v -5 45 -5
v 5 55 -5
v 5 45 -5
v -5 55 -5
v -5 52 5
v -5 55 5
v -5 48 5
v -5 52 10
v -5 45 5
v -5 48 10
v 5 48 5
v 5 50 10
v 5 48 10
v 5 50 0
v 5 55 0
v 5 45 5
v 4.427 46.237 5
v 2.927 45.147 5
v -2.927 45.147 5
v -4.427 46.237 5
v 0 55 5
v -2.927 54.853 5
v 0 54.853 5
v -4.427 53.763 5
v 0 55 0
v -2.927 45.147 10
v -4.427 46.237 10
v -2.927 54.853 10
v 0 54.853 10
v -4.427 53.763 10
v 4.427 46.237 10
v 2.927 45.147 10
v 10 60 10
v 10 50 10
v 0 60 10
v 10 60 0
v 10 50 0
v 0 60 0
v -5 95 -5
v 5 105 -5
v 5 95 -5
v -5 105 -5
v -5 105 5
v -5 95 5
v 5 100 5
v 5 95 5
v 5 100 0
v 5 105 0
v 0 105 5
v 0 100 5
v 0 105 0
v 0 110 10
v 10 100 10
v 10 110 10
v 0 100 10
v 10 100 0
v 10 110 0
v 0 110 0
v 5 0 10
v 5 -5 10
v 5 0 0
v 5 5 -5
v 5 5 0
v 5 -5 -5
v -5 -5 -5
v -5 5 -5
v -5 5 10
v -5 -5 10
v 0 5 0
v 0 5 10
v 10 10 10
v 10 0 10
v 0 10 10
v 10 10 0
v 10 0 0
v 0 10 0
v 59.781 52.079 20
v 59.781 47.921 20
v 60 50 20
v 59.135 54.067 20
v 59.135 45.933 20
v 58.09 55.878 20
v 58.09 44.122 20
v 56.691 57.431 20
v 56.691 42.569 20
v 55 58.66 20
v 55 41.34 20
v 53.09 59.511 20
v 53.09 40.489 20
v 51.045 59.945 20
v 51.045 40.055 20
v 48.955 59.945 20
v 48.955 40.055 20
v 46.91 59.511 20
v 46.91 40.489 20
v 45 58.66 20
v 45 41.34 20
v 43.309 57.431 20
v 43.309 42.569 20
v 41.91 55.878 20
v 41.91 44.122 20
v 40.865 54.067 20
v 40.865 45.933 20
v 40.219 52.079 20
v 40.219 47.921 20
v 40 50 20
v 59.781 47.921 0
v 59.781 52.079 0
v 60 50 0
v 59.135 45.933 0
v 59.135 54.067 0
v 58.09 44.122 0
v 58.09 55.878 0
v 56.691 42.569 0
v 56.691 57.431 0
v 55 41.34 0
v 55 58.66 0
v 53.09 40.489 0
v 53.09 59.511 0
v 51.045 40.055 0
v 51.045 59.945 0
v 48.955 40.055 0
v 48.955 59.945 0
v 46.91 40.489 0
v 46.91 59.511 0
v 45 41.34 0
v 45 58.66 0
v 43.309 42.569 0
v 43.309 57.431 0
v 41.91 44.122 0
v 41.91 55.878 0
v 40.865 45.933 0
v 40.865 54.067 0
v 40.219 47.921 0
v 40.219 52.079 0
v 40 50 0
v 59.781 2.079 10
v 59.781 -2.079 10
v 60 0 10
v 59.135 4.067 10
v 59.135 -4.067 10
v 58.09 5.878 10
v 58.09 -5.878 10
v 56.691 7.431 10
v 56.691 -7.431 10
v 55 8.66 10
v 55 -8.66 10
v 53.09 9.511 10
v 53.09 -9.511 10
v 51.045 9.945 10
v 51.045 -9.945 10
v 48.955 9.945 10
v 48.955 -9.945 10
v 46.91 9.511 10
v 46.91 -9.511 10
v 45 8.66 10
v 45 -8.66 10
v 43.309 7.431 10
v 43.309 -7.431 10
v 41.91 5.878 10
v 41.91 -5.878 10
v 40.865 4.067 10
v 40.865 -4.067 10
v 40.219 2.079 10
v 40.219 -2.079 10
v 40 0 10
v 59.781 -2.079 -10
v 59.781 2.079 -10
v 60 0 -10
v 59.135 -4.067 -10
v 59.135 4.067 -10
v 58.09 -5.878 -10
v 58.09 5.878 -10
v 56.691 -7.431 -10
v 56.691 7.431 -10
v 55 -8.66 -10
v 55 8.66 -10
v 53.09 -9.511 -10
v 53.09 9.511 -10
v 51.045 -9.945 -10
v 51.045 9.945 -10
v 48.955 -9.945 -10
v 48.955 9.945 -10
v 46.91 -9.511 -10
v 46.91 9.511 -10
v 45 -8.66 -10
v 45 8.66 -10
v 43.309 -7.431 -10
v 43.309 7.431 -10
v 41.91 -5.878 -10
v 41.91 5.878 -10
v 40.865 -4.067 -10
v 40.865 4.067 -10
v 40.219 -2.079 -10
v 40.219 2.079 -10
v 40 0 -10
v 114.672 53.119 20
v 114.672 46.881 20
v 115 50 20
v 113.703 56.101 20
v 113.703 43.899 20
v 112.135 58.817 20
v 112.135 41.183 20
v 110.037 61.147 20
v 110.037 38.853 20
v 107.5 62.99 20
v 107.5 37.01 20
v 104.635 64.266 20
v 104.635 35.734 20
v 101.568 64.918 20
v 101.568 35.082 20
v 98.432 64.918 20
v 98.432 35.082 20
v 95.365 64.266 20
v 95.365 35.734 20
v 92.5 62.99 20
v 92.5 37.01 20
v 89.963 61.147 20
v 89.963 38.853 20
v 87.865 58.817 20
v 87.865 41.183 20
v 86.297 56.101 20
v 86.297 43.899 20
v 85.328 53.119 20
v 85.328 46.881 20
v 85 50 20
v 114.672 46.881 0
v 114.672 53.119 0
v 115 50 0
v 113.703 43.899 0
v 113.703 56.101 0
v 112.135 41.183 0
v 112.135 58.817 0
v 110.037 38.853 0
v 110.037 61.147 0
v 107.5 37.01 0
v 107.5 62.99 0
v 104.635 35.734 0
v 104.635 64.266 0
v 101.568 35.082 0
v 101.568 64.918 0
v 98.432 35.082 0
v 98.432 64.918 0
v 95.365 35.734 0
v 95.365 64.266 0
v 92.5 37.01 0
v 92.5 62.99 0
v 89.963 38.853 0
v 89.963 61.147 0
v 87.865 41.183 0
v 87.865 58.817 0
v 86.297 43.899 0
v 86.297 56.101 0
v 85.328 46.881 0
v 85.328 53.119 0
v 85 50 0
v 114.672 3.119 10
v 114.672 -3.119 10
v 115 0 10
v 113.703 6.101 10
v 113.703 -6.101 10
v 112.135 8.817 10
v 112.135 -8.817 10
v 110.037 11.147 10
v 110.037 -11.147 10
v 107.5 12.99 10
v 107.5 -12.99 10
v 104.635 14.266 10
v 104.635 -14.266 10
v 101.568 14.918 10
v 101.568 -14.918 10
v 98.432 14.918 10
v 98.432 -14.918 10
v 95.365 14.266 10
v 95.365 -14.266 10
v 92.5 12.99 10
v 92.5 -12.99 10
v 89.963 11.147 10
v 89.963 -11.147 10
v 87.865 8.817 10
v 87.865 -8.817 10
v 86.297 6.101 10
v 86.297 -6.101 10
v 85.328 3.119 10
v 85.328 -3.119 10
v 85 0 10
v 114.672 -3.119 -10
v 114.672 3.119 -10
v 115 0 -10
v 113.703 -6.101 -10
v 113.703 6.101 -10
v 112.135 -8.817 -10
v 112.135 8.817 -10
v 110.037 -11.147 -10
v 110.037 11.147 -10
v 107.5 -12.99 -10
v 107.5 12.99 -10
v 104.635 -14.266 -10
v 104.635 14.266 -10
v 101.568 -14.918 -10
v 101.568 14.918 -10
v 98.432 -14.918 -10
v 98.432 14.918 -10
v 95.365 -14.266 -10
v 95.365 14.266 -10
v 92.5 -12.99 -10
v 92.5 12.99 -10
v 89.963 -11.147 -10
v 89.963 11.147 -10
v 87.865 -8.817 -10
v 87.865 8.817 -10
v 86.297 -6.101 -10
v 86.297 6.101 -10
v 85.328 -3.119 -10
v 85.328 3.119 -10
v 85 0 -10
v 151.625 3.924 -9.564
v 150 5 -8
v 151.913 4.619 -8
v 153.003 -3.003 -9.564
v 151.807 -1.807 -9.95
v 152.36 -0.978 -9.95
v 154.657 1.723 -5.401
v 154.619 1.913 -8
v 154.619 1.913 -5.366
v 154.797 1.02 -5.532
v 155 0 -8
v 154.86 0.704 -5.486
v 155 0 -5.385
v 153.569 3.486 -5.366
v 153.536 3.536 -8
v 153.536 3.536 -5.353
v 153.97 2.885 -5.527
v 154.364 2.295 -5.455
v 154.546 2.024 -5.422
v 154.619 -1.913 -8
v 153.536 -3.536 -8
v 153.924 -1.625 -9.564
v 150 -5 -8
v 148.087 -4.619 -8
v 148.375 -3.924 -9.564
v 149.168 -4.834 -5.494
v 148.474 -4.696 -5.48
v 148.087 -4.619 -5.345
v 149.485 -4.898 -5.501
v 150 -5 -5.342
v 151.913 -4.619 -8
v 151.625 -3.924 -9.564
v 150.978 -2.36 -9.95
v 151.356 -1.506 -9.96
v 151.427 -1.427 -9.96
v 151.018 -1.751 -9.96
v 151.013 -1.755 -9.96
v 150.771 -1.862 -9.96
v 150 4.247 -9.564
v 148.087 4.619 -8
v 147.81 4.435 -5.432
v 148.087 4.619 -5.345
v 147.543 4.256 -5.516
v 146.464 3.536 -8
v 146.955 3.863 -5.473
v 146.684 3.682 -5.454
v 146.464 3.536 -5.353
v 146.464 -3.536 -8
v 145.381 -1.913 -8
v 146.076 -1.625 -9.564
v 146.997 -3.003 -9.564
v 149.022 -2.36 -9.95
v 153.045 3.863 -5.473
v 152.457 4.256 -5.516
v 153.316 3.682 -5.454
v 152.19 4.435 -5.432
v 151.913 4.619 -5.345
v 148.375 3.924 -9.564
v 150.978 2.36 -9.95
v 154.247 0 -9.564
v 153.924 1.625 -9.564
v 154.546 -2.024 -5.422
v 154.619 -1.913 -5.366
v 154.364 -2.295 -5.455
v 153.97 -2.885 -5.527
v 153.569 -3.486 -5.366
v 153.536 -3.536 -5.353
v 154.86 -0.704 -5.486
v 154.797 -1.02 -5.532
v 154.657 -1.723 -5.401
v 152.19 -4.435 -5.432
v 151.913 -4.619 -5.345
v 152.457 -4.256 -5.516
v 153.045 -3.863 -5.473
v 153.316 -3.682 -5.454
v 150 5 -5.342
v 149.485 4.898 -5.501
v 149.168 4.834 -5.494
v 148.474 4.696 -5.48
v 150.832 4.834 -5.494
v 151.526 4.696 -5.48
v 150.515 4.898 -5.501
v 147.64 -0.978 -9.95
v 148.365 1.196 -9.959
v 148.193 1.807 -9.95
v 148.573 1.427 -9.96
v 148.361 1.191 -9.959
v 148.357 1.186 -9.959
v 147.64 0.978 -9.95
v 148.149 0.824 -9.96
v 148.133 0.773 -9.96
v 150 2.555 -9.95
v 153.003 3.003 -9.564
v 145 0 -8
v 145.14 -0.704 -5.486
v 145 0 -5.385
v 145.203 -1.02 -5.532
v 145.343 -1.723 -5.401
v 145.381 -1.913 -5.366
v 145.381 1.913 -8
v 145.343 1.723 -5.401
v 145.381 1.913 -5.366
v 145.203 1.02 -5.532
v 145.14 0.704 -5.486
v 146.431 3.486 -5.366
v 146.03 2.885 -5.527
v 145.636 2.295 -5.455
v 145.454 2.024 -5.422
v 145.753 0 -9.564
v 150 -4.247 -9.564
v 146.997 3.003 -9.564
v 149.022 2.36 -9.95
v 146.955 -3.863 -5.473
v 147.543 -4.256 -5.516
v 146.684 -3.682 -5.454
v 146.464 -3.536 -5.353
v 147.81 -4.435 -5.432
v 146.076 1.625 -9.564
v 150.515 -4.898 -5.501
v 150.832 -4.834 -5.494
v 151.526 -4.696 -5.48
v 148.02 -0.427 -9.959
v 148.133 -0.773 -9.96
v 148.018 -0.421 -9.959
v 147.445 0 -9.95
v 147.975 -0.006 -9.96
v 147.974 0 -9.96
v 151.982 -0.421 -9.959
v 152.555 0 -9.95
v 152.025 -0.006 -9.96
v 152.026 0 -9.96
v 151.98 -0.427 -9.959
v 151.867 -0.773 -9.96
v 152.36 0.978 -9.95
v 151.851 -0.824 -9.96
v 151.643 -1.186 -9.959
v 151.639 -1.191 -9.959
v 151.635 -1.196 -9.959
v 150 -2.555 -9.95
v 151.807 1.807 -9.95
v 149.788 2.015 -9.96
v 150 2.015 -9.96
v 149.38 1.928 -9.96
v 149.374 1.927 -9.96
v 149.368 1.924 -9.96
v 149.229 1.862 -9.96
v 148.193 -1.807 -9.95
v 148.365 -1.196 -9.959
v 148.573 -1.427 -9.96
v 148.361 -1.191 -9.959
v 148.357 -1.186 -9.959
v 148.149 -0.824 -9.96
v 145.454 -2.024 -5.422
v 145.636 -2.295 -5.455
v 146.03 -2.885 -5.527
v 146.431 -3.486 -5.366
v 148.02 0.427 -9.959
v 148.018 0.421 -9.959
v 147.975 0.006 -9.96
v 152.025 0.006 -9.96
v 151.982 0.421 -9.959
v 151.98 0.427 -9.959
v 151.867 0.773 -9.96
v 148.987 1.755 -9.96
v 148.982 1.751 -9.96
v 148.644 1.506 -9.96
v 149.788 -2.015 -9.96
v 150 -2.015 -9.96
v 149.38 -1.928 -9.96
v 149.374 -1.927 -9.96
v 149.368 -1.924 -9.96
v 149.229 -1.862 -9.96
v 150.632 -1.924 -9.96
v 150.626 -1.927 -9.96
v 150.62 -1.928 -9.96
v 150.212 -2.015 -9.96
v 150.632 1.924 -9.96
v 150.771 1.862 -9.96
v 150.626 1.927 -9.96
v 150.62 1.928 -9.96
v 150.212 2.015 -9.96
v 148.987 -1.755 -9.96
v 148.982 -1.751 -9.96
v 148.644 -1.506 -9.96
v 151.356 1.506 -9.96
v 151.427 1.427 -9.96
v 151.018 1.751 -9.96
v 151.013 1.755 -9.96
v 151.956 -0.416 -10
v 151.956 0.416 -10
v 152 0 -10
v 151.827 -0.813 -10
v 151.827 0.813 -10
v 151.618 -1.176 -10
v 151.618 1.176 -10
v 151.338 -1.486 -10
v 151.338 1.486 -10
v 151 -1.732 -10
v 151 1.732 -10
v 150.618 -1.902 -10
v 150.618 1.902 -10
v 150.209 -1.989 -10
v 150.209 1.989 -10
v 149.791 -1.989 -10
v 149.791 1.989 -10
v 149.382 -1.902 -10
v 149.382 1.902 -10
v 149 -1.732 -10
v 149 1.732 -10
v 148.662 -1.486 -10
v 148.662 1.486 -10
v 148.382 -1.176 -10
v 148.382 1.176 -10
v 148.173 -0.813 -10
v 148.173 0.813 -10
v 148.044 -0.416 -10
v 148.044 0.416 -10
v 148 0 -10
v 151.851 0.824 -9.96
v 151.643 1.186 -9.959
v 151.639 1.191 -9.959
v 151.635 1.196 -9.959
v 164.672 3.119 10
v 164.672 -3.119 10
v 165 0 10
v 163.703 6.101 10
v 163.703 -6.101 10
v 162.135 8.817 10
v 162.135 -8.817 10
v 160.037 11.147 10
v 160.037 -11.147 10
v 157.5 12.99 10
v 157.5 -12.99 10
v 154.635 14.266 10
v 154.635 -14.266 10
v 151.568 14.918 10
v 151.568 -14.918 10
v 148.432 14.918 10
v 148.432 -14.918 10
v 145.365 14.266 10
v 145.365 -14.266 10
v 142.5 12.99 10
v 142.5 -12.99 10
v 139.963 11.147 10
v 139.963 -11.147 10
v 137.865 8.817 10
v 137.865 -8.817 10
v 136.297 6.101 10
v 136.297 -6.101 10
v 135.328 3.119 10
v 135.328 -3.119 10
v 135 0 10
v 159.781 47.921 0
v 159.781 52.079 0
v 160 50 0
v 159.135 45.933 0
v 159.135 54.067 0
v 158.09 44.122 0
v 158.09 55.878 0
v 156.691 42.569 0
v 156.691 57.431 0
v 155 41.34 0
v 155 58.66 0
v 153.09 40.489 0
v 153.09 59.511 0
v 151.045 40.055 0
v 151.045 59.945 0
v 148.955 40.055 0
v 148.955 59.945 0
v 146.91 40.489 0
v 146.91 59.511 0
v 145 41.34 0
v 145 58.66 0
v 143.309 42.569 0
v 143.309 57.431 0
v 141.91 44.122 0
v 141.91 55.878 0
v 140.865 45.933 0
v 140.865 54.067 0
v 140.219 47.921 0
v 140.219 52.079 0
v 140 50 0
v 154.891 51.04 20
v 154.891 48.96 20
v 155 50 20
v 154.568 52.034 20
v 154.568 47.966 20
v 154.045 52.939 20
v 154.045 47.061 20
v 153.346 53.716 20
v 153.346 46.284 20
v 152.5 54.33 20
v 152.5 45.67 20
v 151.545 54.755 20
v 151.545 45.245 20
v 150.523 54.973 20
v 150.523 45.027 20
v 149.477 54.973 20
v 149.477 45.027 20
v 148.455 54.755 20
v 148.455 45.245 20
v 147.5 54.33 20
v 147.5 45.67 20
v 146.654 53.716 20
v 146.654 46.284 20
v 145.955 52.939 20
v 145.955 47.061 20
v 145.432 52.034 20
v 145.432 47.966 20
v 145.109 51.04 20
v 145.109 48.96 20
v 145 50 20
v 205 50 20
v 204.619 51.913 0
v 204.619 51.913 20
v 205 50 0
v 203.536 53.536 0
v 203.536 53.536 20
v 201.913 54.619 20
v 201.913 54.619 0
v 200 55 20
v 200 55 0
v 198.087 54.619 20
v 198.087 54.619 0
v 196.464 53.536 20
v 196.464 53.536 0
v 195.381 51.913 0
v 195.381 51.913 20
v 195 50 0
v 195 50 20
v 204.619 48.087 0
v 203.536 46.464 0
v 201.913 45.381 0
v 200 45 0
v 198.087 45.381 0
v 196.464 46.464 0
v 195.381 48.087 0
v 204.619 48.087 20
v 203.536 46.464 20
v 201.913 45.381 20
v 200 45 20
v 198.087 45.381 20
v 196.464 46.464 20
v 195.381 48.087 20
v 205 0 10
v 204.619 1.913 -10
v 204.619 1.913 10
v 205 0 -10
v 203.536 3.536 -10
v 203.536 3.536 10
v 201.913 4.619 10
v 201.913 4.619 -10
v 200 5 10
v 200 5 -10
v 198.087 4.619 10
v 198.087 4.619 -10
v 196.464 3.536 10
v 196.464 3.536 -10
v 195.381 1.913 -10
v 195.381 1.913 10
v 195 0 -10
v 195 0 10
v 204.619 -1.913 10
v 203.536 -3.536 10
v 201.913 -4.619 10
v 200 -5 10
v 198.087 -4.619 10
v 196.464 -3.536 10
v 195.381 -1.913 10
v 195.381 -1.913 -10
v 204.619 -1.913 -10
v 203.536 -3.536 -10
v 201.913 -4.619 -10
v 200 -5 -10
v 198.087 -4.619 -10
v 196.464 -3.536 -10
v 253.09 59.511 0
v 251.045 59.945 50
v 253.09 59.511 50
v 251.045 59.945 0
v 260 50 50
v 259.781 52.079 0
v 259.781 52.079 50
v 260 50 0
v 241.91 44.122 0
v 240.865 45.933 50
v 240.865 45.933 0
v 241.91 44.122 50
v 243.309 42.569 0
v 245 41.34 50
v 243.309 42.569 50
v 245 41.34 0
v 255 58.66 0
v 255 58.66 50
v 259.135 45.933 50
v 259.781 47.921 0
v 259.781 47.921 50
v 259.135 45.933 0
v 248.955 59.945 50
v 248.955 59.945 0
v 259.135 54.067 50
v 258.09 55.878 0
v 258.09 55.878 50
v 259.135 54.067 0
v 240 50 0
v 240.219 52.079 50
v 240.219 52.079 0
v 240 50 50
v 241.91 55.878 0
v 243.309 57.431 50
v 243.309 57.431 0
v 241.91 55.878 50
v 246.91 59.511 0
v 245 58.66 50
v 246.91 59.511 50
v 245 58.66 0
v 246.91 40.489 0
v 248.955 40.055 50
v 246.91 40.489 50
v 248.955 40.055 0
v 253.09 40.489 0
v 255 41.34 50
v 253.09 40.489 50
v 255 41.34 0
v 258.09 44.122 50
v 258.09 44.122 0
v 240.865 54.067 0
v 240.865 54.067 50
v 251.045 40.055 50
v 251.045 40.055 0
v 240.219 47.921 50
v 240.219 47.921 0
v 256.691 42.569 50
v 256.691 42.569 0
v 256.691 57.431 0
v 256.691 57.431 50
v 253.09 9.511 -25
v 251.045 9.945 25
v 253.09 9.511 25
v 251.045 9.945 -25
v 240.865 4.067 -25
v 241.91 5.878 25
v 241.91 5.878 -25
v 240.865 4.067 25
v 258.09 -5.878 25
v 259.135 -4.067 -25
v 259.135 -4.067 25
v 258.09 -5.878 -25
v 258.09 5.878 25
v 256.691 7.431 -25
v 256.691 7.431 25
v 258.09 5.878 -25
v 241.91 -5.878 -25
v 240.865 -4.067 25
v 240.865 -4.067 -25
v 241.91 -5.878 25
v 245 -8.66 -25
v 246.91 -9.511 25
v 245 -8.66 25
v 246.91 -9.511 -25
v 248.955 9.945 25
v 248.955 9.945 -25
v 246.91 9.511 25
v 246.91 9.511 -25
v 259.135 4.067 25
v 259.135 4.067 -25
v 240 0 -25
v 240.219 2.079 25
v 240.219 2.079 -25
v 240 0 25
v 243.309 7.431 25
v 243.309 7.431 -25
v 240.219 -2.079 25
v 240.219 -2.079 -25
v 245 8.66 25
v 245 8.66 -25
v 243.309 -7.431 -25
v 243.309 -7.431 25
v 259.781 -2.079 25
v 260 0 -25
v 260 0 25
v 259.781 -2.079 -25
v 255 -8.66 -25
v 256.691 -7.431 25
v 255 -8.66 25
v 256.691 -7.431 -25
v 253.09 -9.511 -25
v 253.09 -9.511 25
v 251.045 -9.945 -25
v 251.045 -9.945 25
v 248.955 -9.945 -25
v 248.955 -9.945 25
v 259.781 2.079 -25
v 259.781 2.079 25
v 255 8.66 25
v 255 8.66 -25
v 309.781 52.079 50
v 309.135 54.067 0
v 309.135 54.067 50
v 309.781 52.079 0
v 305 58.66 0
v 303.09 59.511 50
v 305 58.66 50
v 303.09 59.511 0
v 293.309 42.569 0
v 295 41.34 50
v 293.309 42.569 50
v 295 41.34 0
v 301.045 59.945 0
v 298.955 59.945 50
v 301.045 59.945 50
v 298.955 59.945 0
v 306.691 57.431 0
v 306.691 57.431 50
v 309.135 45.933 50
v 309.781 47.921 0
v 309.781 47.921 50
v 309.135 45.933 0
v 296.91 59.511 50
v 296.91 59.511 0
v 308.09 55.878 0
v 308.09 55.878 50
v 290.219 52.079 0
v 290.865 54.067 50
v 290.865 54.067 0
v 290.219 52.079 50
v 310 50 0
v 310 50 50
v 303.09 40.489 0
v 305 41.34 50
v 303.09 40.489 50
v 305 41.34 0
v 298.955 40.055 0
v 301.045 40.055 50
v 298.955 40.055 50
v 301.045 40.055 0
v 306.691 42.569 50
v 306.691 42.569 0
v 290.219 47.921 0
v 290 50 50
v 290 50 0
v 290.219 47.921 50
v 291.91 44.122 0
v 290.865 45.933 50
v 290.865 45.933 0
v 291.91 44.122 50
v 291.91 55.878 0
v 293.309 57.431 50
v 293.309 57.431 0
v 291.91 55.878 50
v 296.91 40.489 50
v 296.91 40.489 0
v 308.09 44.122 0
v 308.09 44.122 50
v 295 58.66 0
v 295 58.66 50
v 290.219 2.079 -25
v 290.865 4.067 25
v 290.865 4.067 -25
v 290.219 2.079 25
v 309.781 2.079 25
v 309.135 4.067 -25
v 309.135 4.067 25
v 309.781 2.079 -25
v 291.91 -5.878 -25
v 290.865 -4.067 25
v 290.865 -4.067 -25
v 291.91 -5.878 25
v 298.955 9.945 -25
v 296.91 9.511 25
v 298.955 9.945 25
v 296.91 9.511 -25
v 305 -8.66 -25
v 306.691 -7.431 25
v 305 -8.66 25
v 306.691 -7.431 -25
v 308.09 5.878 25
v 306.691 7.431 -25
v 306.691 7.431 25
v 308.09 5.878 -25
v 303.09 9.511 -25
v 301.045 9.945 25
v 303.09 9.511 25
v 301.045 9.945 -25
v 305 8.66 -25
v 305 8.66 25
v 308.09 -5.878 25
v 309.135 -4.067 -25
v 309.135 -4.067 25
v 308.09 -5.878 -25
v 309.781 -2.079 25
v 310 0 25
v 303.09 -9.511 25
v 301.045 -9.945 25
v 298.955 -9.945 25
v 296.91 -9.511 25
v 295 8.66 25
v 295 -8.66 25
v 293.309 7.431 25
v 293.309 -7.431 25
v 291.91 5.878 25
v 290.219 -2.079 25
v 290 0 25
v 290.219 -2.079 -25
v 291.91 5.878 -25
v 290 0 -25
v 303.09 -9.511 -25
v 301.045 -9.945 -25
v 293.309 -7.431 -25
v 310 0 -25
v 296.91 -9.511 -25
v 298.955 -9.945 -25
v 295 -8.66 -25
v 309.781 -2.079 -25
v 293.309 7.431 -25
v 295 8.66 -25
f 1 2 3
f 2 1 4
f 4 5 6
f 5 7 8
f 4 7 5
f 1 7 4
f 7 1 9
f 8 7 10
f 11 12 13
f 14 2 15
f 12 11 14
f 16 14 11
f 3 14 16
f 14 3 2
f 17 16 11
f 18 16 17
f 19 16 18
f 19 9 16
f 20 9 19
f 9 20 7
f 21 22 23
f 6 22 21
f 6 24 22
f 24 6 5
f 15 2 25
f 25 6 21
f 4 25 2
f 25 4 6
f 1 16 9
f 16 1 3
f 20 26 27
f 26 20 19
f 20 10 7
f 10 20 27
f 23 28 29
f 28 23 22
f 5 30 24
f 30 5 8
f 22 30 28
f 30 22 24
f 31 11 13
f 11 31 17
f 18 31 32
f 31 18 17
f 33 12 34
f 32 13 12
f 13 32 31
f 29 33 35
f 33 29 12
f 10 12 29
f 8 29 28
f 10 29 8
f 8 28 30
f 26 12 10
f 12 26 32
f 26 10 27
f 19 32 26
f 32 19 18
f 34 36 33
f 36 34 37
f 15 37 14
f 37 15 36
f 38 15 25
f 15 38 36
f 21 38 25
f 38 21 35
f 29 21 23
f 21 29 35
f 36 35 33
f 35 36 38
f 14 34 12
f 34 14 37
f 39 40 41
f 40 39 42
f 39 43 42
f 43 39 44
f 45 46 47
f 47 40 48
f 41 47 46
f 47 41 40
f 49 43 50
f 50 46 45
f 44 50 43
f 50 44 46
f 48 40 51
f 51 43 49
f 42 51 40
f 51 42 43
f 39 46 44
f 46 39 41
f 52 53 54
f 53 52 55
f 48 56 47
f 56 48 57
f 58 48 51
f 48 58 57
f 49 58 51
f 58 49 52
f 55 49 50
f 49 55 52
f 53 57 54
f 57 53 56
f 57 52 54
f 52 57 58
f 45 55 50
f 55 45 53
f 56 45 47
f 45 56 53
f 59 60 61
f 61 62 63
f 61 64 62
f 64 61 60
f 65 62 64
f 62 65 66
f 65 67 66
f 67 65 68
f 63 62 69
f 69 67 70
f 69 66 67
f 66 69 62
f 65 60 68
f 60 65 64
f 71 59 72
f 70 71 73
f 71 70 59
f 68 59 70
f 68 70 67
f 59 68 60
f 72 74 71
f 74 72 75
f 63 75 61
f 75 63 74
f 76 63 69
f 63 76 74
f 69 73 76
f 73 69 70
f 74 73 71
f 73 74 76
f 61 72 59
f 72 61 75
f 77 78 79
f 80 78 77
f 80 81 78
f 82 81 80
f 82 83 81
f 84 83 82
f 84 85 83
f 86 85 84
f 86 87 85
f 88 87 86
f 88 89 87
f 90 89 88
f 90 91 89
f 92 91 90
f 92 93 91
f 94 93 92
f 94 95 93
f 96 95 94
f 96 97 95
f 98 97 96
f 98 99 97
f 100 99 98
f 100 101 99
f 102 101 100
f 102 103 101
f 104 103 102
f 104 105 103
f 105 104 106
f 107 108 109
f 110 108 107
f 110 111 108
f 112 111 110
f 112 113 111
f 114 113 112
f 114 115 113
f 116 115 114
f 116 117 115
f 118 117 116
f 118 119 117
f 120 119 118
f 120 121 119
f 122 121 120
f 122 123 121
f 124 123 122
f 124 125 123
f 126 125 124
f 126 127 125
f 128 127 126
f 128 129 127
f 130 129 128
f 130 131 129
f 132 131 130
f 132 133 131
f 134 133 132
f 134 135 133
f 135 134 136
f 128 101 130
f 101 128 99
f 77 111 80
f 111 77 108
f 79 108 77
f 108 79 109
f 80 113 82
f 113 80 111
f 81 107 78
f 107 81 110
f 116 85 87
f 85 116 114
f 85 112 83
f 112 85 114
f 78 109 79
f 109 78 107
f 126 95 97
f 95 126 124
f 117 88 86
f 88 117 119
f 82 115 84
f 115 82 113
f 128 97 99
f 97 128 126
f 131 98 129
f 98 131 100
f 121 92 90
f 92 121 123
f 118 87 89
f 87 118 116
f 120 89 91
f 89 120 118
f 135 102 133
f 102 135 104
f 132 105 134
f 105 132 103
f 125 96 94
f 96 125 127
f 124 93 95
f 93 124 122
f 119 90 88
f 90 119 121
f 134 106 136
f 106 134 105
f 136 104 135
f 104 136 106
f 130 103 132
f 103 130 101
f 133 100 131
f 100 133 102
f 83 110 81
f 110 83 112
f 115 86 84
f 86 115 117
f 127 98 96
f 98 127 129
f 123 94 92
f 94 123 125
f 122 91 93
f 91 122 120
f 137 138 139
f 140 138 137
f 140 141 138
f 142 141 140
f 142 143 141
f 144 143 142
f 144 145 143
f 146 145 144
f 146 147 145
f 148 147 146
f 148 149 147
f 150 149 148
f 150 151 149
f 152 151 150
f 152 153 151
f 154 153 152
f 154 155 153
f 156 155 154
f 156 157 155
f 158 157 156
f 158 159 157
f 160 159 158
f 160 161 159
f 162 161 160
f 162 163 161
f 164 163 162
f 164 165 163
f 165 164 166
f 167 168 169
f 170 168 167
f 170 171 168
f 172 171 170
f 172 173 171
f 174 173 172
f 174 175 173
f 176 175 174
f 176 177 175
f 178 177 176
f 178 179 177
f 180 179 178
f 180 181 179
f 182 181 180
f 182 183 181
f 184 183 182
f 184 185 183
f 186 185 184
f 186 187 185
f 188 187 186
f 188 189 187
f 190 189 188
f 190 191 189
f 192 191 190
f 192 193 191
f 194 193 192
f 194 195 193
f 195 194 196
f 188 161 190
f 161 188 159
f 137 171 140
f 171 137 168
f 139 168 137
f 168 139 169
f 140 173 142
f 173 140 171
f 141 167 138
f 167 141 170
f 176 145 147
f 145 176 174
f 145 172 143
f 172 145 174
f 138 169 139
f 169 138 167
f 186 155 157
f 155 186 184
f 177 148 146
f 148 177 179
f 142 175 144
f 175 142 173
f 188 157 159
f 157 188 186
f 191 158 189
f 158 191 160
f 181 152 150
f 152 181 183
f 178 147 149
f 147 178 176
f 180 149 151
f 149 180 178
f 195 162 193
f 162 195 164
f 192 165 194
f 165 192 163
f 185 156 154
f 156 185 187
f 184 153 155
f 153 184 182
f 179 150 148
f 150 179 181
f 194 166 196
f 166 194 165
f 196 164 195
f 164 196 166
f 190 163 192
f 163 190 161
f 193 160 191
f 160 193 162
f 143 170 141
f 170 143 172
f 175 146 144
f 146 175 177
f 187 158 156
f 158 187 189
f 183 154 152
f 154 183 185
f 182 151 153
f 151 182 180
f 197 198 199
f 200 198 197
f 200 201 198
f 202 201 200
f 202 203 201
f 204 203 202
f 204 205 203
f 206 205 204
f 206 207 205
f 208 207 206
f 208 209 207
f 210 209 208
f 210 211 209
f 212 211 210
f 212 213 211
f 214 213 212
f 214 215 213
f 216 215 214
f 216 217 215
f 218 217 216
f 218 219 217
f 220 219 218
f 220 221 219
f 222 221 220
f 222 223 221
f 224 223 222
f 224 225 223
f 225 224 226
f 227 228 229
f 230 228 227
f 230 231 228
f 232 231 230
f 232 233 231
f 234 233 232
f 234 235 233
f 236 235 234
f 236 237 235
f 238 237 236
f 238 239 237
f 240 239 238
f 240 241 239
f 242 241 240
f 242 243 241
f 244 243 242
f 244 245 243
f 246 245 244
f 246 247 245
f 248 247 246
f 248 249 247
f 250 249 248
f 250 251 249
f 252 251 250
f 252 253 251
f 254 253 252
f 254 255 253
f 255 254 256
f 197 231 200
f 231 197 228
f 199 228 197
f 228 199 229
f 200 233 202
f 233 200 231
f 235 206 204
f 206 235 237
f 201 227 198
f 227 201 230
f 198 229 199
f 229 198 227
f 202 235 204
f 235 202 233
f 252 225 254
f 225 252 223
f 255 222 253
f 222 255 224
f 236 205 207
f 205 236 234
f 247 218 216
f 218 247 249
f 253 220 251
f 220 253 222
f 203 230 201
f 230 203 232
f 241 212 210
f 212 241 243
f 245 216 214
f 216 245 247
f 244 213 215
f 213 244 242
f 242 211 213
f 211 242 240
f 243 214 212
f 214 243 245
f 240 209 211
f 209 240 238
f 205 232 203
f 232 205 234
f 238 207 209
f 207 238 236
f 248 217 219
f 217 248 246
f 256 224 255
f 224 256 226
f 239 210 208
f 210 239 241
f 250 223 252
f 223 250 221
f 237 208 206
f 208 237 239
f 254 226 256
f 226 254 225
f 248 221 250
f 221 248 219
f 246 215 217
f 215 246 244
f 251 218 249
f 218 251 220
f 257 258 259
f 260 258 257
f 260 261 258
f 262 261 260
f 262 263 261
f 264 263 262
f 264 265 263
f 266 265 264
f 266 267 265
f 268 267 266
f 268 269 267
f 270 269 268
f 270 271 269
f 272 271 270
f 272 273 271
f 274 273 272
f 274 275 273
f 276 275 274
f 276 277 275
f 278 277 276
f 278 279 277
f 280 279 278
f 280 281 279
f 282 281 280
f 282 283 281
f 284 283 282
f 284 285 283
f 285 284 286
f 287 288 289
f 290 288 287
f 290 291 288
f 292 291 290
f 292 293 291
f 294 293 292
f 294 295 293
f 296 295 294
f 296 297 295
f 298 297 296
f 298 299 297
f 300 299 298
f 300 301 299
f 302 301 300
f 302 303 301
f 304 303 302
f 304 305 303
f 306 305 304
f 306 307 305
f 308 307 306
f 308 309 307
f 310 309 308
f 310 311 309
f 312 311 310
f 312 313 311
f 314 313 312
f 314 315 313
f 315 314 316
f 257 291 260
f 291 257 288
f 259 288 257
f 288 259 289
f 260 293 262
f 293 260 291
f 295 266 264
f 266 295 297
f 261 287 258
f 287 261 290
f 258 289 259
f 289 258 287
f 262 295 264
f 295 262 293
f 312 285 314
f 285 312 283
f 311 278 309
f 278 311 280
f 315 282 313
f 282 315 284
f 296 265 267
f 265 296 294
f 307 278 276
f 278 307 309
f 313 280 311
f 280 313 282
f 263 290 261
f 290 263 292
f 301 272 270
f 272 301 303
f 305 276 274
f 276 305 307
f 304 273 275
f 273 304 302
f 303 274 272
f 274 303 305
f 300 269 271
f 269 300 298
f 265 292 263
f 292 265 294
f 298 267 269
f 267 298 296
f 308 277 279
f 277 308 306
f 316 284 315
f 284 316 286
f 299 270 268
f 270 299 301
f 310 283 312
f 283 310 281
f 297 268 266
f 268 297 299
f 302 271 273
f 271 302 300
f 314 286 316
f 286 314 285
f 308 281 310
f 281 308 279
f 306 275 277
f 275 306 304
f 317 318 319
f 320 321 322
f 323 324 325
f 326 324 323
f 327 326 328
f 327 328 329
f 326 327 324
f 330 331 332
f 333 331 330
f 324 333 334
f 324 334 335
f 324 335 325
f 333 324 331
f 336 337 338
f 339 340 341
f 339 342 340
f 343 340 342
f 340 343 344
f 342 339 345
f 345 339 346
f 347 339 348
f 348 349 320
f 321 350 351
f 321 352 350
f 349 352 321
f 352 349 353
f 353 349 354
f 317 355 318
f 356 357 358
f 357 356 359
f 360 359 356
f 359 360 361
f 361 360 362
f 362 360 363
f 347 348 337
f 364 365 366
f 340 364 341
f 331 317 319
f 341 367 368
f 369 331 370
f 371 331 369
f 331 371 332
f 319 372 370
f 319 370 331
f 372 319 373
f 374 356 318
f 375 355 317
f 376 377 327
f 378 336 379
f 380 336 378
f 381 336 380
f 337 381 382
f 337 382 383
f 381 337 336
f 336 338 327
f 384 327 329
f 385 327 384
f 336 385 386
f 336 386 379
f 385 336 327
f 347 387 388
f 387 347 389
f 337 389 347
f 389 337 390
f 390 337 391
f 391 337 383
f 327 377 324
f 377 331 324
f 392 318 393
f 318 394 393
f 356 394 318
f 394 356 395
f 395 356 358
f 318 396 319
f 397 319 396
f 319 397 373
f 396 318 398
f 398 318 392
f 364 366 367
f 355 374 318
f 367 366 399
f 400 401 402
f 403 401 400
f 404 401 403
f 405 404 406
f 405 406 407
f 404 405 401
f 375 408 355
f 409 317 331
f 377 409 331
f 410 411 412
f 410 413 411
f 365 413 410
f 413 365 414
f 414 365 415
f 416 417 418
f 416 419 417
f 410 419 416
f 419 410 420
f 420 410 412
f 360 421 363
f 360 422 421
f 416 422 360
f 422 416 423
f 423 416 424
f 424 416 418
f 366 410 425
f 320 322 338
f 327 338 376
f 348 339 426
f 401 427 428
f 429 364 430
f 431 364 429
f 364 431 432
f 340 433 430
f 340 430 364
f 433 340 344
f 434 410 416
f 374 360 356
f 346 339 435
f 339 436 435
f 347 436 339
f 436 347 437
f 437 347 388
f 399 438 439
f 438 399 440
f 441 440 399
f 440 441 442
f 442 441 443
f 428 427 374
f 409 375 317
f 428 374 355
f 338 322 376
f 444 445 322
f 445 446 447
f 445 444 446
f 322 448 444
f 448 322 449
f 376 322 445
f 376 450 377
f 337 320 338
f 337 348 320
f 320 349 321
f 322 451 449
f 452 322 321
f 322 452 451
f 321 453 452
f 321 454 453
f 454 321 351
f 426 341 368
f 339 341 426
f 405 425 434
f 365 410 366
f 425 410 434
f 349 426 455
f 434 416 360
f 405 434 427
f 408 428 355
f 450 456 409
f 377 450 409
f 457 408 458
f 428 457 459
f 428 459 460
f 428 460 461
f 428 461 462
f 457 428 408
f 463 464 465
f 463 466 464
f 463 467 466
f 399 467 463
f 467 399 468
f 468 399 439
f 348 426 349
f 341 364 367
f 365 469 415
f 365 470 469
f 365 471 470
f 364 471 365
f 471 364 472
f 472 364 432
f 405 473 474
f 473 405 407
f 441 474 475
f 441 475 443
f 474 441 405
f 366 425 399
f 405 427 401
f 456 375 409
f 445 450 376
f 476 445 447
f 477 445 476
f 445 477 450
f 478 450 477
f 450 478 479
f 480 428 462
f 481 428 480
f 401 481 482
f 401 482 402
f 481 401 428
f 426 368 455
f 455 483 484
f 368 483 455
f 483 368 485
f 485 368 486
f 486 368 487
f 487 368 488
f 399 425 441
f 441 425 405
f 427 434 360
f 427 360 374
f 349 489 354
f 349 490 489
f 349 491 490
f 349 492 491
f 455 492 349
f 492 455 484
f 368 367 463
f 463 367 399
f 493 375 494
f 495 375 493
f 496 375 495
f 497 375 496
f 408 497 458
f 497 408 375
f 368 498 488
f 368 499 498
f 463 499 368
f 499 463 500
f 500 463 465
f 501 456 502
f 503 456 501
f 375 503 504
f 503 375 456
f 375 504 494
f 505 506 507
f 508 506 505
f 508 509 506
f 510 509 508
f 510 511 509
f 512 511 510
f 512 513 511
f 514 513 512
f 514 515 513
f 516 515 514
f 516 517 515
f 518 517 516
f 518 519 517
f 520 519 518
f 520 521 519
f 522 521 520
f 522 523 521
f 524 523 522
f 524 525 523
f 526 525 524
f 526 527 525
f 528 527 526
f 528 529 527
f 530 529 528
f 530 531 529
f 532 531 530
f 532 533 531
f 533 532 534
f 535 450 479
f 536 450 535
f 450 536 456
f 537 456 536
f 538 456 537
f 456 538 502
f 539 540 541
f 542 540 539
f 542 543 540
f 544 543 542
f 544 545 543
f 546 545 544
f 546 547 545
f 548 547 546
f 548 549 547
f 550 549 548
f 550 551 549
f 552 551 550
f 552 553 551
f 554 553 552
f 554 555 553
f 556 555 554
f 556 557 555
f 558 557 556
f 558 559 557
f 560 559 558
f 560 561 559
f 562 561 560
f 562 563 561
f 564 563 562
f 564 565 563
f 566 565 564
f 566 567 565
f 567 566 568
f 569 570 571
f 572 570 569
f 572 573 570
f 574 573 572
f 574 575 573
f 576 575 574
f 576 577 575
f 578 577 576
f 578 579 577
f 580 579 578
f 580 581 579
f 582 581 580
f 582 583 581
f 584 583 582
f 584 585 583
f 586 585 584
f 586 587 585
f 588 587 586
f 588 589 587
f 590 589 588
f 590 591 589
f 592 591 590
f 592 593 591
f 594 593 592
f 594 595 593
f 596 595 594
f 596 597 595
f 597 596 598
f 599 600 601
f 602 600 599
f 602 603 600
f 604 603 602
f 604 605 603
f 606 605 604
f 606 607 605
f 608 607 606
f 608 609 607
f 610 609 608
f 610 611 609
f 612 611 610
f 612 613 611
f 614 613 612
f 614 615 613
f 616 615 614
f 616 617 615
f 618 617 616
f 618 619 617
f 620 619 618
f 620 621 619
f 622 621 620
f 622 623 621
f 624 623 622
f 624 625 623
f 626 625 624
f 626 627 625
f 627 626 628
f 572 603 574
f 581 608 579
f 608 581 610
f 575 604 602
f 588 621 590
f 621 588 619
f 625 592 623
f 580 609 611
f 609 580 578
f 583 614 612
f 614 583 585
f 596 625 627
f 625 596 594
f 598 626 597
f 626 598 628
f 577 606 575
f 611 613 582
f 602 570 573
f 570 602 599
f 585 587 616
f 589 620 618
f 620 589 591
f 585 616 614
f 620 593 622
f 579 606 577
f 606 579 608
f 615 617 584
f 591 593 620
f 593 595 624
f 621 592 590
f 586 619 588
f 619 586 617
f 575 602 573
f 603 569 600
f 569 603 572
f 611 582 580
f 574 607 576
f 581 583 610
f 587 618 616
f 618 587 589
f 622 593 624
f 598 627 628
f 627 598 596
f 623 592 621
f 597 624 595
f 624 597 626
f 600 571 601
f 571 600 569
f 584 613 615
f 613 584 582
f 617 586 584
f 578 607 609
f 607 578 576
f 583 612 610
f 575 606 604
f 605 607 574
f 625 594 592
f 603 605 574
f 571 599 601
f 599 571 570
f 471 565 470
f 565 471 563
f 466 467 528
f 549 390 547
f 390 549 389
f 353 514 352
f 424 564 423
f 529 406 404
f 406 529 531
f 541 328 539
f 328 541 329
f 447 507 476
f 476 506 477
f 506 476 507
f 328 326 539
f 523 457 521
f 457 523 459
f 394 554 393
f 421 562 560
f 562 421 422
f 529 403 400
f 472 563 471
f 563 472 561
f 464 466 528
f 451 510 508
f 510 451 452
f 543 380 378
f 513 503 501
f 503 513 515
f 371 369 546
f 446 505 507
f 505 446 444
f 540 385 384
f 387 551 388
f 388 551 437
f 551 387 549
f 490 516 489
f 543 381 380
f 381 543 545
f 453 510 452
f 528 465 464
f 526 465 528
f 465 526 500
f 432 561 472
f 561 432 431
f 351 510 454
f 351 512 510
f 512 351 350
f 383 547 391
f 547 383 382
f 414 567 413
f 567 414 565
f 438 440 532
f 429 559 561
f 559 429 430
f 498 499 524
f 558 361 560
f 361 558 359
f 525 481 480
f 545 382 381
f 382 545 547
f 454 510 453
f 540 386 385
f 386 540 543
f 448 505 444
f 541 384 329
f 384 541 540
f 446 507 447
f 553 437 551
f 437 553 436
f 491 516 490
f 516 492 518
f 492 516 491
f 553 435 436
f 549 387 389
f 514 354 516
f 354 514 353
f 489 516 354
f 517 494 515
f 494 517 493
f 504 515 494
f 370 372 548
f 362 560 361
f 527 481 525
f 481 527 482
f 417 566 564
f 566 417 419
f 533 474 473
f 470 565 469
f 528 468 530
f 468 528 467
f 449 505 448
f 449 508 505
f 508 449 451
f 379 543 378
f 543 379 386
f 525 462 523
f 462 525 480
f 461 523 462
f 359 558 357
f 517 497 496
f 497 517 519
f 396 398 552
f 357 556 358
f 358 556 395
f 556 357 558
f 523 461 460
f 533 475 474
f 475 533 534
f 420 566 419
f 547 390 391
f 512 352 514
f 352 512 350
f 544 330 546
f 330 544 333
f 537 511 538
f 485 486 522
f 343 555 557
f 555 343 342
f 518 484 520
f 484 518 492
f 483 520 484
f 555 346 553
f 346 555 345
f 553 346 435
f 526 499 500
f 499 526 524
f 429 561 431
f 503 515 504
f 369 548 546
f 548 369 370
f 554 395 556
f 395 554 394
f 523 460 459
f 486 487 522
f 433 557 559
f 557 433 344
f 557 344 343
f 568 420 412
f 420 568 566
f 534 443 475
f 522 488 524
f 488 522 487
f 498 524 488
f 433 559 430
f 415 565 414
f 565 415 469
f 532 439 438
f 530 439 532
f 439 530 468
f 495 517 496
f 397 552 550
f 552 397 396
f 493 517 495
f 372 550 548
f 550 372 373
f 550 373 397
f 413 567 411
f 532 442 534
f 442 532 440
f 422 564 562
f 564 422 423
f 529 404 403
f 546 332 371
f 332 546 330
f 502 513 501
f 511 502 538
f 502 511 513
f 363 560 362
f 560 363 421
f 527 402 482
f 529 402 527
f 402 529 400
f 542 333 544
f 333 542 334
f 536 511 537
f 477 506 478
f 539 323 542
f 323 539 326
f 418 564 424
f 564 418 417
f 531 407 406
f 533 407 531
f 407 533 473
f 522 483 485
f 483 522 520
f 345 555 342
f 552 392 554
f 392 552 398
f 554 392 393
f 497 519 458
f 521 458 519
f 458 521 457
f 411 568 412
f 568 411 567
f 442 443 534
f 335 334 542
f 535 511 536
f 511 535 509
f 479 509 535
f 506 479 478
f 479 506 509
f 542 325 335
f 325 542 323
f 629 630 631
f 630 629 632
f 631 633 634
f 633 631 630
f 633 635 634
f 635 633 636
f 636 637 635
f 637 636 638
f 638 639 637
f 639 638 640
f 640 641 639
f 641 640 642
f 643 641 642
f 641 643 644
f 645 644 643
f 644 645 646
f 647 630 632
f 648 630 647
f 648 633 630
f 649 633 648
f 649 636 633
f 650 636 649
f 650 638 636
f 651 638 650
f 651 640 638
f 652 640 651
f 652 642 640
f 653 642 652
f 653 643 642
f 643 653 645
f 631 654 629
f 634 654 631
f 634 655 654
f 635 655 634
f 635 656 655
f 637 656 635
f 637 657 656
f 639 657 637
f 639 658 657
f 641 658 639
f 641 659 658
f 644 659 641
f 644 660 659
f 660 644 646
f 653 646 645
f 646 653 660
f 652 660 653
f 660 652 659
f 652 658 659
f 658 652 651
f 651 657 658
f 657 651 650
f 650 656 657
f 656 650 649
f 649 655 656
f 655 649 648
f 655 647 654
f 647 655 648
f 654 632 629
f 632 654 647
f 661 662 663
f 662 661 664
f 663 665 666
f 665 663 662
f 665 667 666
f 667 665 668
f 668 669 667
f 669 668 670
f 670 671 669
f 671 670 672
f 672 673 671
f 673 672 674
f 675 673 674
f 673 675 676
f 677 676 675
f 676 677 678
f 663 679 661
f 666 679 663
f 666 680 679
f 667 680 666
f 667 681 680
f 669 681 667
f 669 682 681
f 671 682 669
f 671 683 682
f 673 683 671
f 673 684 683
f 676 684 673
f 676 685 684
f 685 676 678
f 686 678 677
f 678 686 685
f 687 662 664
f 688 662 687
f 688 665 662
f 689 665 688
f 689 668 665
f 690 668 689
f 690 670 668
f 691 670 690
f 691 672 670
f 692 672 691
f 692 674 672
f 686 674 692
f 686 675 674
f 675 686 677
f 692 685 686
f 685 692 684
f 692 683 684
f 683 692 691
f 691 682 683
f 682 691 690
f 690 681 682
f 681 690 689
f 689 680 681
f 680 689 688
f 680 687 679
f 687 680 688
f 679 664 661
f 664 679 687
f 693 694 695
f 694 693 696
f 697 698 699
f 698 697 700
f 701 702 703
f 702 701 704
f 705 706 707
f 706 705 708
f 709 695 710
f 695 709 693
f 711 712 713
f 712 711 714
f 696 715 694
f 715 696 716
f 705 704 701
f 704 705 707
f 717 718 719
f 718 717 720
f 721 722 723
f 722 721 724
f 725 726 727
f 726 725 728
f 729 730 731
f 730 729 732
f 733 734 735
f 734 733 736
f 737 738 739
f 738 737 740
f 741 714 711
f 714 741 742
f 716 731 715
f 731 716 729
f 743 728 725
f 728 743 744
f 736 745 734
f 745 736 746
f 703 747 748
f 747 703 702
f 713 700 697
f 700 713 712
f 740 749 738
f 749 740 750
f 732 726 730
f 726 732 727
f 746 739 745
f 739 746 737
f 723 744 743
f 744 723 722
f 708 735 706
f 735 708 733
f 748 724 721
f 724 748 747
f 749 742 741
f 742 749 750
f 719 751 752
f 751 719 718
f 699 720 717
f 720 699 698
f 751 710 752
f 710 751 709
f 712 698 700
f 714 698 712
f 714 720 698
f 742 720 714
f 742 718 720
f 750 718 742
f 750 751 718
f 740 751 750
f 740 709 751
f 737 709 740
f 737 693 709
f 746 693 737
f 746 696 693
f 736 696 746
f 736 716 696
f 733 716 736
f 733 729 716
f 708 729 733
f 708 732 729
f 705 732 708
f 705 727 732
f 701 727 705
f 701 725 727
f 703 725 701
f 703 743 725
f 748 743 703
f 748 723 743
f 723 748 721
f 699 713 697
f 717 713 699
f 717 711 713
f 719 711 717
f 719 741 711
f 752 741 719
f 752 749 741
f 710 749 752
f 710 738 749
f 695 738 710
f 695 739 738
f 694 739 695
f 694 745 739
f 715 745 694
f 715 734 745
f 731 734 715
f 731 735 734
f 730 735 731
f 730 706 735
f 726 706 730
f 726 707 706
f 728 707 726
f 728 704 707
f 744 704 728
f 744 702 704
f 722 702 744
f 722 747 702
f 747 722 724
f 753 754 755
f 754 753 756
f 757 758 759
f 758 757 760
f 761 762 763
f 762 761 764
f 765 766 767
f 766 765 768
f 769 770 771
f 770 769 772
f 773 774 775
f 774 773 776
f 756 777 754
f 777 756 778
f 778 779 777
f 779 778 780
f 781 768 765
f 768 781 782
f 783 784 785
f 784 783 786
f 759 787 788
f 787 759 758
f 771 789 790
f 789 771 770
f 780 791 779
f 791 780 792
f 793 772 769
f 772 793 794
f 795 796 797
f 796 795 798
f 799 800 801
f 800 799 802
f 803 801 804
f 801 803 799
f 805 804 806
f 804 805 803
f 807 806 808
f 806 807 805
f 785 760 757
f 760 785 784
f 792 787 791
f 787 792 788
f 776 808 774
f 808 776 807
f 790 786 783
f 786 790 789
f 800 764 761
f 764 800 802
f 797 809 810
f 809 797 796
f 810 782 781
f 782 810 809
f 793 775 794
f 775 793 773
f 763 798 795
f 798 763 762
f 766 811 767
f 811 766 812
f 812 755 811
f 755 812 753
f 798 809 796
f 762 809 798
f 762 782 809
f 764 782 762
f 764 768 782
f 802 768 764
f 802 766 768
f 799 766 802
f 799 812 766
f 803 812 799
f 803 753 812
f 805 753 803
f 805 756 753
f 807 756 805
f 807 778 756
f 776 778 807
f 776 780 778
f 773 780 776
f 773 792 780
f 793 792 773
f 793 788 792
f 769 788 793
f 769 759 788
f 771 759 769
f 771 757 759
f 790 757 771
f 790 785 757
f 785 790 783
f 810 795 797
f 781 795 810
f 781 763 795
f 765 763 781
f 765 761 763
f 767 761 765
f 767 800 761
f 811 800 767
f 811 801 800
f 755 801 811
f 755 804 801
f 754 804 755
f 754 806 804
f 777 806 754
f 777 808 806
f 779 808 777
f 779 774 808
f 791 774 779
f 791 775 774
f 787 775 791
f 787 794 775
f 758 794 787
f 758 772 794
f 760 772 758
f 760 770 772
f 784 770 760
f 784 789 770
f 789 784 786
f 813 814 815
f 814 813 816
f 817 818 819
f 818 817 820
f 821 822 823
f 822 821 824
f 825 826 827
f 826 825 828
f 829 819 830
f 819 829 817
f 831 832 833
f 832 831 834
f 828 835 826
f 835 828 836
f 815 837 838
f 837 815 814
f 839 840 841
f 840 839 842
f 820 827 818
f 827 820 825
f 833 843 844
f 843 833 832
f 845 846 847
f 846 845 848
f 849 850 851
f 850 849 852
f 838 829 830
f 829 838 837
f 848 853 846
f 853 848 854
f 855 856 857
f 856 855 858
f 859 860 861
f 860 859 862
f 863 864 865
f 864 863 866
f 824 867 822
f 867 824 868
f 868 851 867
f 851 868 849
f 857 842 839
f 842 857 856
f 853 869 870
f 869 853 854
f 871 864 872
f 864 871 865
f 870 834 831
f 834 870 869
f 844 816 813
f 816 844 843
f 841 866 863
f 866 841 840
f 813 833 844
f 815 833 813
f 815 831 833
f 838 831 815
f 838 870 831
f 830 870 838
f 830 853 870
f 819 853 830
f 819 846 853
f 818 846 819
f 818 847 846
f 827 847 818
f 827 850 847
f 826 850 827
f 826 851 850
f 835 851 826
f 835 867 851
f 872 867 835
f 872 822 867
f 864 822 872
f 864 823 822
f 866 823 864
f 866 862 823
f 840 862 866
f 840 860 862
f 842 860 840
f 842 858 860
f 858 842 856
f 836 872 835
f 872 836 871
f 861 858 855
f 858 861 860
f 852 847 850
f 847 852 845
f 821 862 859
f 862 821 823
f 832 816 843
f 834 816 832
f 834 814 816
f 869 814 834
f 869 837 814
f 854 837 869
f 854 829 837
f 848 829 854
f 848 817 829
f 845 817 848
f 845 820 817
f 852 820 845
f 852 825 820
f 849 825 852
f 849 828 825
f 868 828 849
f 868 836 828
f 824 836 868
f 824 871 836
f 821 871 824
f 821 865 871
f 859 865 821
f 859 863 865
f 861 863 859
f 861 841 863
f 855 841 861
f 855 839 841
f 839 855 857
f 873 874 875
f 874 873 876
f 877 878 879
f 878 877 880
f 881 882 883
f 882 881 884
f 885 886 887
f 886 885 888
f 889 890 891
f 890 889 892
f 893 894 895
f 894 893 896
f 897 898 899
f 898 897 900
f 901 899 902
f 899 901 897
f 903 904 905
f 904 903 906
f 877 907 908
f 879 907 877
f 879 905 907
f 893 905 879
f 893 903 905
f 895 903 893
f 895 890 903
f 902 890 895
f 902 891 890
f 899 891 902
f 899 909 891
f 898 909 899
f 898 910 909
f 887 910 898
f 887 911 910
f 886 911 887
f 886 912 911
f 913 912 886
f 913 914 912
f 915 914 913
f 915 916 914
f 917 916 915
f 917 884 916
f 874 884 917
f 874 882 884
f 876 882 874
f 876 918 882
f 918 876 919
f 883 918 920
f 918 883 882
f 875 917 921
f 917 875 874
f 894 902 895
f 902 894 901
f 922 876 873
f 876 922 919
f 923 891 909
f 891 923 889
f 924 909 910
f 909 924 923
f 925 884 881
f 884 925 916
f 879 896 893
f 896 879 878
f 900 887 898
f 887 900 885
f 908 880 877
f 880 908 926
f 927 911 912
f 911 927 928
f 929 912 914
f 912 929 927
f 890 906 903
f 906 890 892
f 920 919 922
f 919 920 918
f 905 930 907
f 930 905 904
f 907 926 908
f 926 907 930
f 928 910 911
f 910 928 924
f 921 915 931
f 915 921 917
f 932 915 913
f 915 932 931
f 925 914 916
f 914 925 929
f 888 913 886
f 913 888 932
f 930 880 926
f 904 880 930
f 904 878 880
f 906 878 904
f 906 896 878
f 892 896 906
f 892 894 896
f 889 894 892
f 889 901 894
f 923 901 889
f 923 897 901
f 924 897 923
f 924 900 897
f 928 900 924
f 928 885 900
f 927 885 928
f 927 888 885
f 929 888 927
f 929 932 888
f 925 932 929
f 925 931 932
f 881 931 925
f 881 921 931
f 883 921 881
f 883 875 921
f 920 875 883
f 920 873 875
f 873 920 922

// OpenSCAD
// file: ../common/transformations.scad
// https://en.wikibooks.org/wiki/OpenSCAD_User_Manual/Transformations#offset

/**
Rounds all inside (concave) corners but leaves flat walls unchanged.
Holes less than 2 * \r in diameter vanish.
Think of this transformation as a circle sliding around the exterior of the
shape.
*/
module fillet(r) { offset(r = -r) offset(delta = r) children(); }

/**
Rounds all outside (convex) corners but leaves flat walls unchanged.
Walls less than 2 * \r thick vanish.
Think of this transformation as a circle sliding around the interior of the
shape.
*/
module round(r) { offset(r = r) offset(delta = -r) children(); }

/**
Apply both round then fillet.
Walls less than 2 * \r thick vanish. Holes less than 2 * \r in diameter vanish.
Think of this transformation as a circle sliding around the interior and then
around the exterior of the shape.
*/
module round_fillet(r, r1 = undef, r2 = undef) {
  r2 = is_undef(r2) ? r : r2;
  r1 = is_undef(r1) ? r : r1;
  round(r1) fillet(r2) children();
}

/**
Add a chamfer to convex and/or concave corners.
Same operation as round (convex) and/or fillet (concave) but edges are cut off
with a straight line.
*/
module chamfer(r, convex = true, concave = true) {
  offset(delta = r, chamfer = convex) offset(delta = -r, chamfer = concave) {
    children();
  }
}

// UNTESTED
// /**
// Rounds (\out_r) all outside (convex) corners but leaves flat walls unchanged.
// Rounds (\in_r) all inside (concave) corners but leaves flat walls unchanged.
// However, walls less than 2 * \r thick vanish.
// Thing of this transformation as a circle sliding around the exterior of the
// shape.
// */
// module round(in_r = 3, out_r = 1) {
//   offset(out_r) {
//     offset(-in_r - out_r) {
//       offset(in_r) { children(); }
//     }
//   }
// }
// UNTESTED

/** Extrudes 2D object to 3D when `h` is
 *  nonzero, otherwise leaves it 2D
 */
module extrude_if(h = undef, center = true) {
  if (h)
    // 3D
    linear_extrude(h, center = center, convexity = 5) children();
  else
    // 2D
    children();
}


//
// Tests
//

module __xSpacing(i) { translate([ 50.0 * i, 0.0, 0.0 ]) children(); }
module __ySpacing(j) { translate([ 0.0, 50.0 * j, 0.0 ]) children(); }


__xSpacing(1) {
  color("Green", 0.5) square([ 15, 10 ], center = true);

  __ySpacing(0.5) {
    color("Blue", 0.25) square([ 15, 10 ], center = true);
    color("Green", 0.5) fillet(4) square([ 15, 10 ], center = true);
  }
  __ySpacing(1) {
    color("Blue", 0.25) square([ 15, 10 ], center = true);
    color("Green", 0.5) round(4) square([ 15, 10 ], center = true);
  }
  __ySpacing(1.5) {
    color("Blue", 0.25) square([ 15, 10 ], center = true);
    color("Green", 0.5) chamfer(4) square([ 15, 10 ], center = true);
  }

  __ySpacing(2) {
    color("Blue", 0.25) square([ 15, 10 ], center = true);
    color("Green", 0.5) round_fillet(4) square([ 15, 10 ], center = true);
  }
}
// file: ../common/constants.scad
//
// Constants
//

// Minimal distance required to overlap shapes for boolean cutting
TOL = 0.01;
EPS = 0.0001;
INF = 1e10;

// Force consistency accross codebase
PI = 3.141592653;
TAU = 2 * PI;
TWO_PI = TAU;

// Help visualizing each axis direction (relative to each other)
right = [ 1, 0, 0 ];   // width
forward = [ 0, 1, 0 ]; // depth
up = [ 0, 0, 1 ];      // height
// file: shapes2D.scad
include <../common/constants.scad>

//
// 2D Shapes
//

// Irregular circle (Y axis scaled)
module ellipse(width, depth) {
  scale([ 1, depth / width, 1 ]) circle(r = width / 2);
}

// A square with rounded corners
module square_rounded(size = [ 1.0, 1.0 ], r = 1.0, center = false) {
  x = is_list(size) ? size[0] : size;
  y = is_list(size) ? size[1] : size;

  if (center) {
    body();
  } else {
    translate([ x, y ] / 2) body();
  }

  module body() {
    hull() {
      // Put circle on each corner
      translate([ (-x / 2) + r, (-y / 2) + r ]) { circle(r = r); }
      translate([ (x / 2) - r, (-y / 2) + r ]) { circle(r = r); }
      translate([ (-x / 2) + r, (y / 2) - r ]) { circle(r = r); }
      translate([ (x / 2) - r, (y / 2) - r ]) { circle(r = r); }
    }
  }
}

module square_rounded_one(size, r, center = false) {
  h = is_list(size) ? size.y : size;
  w = is_list(size) ? size.x : size;
  translate(center ? [ -w, -h ] / 2 : [ 0, 0 ]) hull() {
    intersection() {
      translate([ w - r, h - r ]) circle(r = r);
      square([ w, h ]);
    }
    square([ w, EPS ]);
    square([ EPS, h ]);
  }
}

//
// Tests
//

use <../common/transformations.scad>

module __xSpacing(i) { translate([ 50.0 * i, 0.0, 0.0 ]) children(); }
module __ySpacing(j) { translate([ 0.0, 50.0 * j, 0.0 ]) children(); }

// Ellipses
__xSpacing(0) { ellipse(10, 50); }

// Squares
__xSpacing(1) {
  color("Green", 0.5) square([ 15, 10 ], center = true);
  square_rounded_one([ 15, 10 ], 5, center = true);

  __ySpacing(1) {
    color("Green", 0.5) square([ 15, 10 ], center = false);
    square_rounded_one([ 15, 10 ], 5, center = false);
  }
}

__xSpacing(2) {
  color("Green", 0.5) square([ 15, 10 ], center = true);
  square_rounded([ 15, 10 ], 5, center = true);

  __ySpacing(1) {
    color("Green", 0.5) square([ 15, 10 ], center = false);
    square_rounded([ 15, 10 ], 5, center = false);
  }
}
// main file
use <../component/shapes2D.scad>

//
// 3D Shapes
//

/** A cube centered on the XY plane by default but not on the Z axis.
Same behavior as cylinder(center=false).
\param size Cube dimensions
\param center True --> cube_XY and cube behave the same
*/
module cube_XY(size, center = false) {
  if (is_list(size)) {
    translate([ -size[0], -size[1], center ? -size[2] : 0.0 ] / 2.0) cube(size);
  } else {
    translate([ -size, -size, center ? -size : 0.0 ] / 2.0) cube(size);
  }
}

/** A cylinder with only 6 sides
\param size Size on the XY plane
\param height Extrusion size on the Z axis
*/
module hexagon(width, height, center = false) {
  cylinder(r = width, h = height, center = center, $fn = 6);
}

// Oval shape
module oval(height, rx, ry, center = false) {
  scale([ 1, rx / ry, 1 ]) cylinder(h = height, r = ry, center = center);
}

// A cube built by extrusion of square_rounded centered on the XY plane
module cube_XY_rounded(size, r = 1.0, center = false) {
  sizeVec = is_list(size) ? size : [ size, size, size ];
  translate([ 0.0, 0.0, center ? -sizeVec[2] / 2.0 : 0.0 ])
      linear_extrude(height = sizeVec[2])
          square_rounded(size = sizeVec, r = r, center = true);
}

// A cube built by extrusion of square_rounded
module cube_rounded(size, r = 1.0, center = false) {
  sizeVec = is_list(size) ? size : [ size, size, size ];
  translate([ 0.0, 0.0, center ? -sizeVec[2] / 2.0 : 0.0 ])
      linear_extrude(height = sizeVec[2])
          square_rounded(size = sizeVec, r = r, center = center);
}

module cylinder_rounded(size, r, center = false, r1 = undef, r2 = undef) {
  w = is_list(size) ? size.x : size;
  h = is_list(size) ? size.y : size;
  half_h = h / 2.0;
  r2 = is_undef(r2) ? r : r2;
  r1 = is_undef(r1) ? r : r1;
  translate([ 0.0, 0.0, center ? 0 : half_h ]) {
    render() union() {
      rotate([ 0.0, 180.0, 0 ])
       rotate_extrude()
          square_rounded_one([ w, half_h ], r1);
      rotate_extrude() square_rounded_one([ w, half_h ], r2);
    }
  }
}

module cylinder_semirounded(size, r, center = false) {
  w = is_list(size) ? size.x : size;
  h = is_list(size) ? size.y : size;
  translate([ 0.0, 0.0, center ? h / 2 : h ]) {
    render() rotate([ 0.0, 180.0, 0 ]) rotate_extrude() square_rounded_one([ w, h ], r);
  }
}

module capsule(height, r, center = false) {
  translate([ 0.0, 0.0, center ? 0 : height / 2.0 ]) {
    delta = height / 2.0 - r;
    hull() {
      translate([ 0.0, 0.0, delta ]) sphere(r = r);
      translate([ 0.0, 0.0, -delta ]) sphere(r = r);
    }
  }
}

module capsule_semirounded(height, r, center = false) {
  cylinder_semirounded([ r, height ], r, center = center);
}

//
// Tests
//

module __xSpacing(i) { translate([ 50.0 * i, 0.0, 0.0 ]) children(); }
module __ySpacing(j) { translate([ 0.0, 50.0 * j, 0.0 ]) children(); }

// Cubes
__xSpacing(0) {
  cube_XY(10.0, center = true);
  color("Orange", 0.25) cube(10.0, center = true);
  color("Green", 0.5) cube_XY(10.0, center = false);
  color("Orange", 0.25) cube(10.0, center = false);

  __ySpacing(1) {
    cube_XY_rounded(10.0, r = 3.0, center = true);
    color("Orange", 0.25) cube(10.0, center = true);
    color("Green", 0.5) cube_XY_rounded(10.0, r = 3.0, center = false);
    color("Orange", 0.25) cube(10.0, center = false);
  }

  __ySpacing(2) {
    cube_rounded(10.0, r = 3.0, center = true);
    color("Orange", 0.25) cube(10.0, center = true);
    color("Green", 0.5) cube_rounded(10.0, r = 3.0, center = false);
    color("Orange", 0.25) cube(10.0, center = false);
  }
}

// Hexagons
__xSpacing(1) {
  hexagon(10.0, 20.0, true);
  color("Orange", 0.25) cylinder(r = 10.0, h = 20.0, center = true);

  __ySpacing(1) {
    hexagon(10.0, 20.0, false);
    color("Orange", 0.25) cylinder(r = 10.0, h = 20.0, center = false);
  }
}
// Ovals
__xSpacing(2) {
  oval(20.0, 10.0, 15.0, center = true);
  color("Orange", 0.25) cylinder(h = 20.0, r = 15.0, center = true);

  __ySpacing(1) {
    oval(20.0, 10.0, 15.0, center = false);
    color("Orange", 0.25) cylinder(h = 20.0, r = 15.0, center = false);
  }
}

// Cylinders rounded
__xSpacing(3) {
  cylinder_rounded([ 5.0, 20.0 ], r1 = 2.0, r2 = 15.0, center = true);
  color("Orange", 0.25) cylinder(h = 20.0, r1 = 2.0, r2 = 15.0, center = true);

  __ySpacing(1) {
    cylinder_rounded([ 5.0, 20.0 ], r1 = 10.0, r2 = 5.0, center = false);
    color("Orange", 0.25)
        cylinder(h = 20.0, r1 = 10.0, r2 = 5.0, center = false);
  }
}

__xSpacing(4) {
  cylinder_semirounded([ 5.0, 20.0 ], r = 5.0, center = true);
  color("Orange", 0.25) cylinder(h = 20.0, r = 5.0, center = true);

  __ySpacing(1) {
    cylinder_semirounded([ 5.0, 20.0 ], r = 5.0, center = false);
    color("Orange", 0.25) cylinder(h = 20.0, r = 5.0, center = false);
  }
}

// Capsules
__xSpacing(5) {
  capsule(50.0, 10.0, center = true);
  color("Orange", 0.25) cylinder(h = 50.0, r = 10.0, center = true);

  __ySpacing(1) {
    capsule(50.0, 10.0, center = false);
    color("Orange", 0.25) cylinder(h = 50.0, r = 10.0, center = false);
  }
}

__xSpacing(6) {
  capsule_semirounded(50.0, 10.0, center = true);
  color("Orange", 0.25) cylinder(h = 50.0, r = 10.0, center = true);

  __ySpacing(1) {
    capsule_semirounded(50.0, 10.0, center = false);
    color("Orange", 0.25) cylinder(h = 50.0, r = 10.0, center = false);
  }
}
